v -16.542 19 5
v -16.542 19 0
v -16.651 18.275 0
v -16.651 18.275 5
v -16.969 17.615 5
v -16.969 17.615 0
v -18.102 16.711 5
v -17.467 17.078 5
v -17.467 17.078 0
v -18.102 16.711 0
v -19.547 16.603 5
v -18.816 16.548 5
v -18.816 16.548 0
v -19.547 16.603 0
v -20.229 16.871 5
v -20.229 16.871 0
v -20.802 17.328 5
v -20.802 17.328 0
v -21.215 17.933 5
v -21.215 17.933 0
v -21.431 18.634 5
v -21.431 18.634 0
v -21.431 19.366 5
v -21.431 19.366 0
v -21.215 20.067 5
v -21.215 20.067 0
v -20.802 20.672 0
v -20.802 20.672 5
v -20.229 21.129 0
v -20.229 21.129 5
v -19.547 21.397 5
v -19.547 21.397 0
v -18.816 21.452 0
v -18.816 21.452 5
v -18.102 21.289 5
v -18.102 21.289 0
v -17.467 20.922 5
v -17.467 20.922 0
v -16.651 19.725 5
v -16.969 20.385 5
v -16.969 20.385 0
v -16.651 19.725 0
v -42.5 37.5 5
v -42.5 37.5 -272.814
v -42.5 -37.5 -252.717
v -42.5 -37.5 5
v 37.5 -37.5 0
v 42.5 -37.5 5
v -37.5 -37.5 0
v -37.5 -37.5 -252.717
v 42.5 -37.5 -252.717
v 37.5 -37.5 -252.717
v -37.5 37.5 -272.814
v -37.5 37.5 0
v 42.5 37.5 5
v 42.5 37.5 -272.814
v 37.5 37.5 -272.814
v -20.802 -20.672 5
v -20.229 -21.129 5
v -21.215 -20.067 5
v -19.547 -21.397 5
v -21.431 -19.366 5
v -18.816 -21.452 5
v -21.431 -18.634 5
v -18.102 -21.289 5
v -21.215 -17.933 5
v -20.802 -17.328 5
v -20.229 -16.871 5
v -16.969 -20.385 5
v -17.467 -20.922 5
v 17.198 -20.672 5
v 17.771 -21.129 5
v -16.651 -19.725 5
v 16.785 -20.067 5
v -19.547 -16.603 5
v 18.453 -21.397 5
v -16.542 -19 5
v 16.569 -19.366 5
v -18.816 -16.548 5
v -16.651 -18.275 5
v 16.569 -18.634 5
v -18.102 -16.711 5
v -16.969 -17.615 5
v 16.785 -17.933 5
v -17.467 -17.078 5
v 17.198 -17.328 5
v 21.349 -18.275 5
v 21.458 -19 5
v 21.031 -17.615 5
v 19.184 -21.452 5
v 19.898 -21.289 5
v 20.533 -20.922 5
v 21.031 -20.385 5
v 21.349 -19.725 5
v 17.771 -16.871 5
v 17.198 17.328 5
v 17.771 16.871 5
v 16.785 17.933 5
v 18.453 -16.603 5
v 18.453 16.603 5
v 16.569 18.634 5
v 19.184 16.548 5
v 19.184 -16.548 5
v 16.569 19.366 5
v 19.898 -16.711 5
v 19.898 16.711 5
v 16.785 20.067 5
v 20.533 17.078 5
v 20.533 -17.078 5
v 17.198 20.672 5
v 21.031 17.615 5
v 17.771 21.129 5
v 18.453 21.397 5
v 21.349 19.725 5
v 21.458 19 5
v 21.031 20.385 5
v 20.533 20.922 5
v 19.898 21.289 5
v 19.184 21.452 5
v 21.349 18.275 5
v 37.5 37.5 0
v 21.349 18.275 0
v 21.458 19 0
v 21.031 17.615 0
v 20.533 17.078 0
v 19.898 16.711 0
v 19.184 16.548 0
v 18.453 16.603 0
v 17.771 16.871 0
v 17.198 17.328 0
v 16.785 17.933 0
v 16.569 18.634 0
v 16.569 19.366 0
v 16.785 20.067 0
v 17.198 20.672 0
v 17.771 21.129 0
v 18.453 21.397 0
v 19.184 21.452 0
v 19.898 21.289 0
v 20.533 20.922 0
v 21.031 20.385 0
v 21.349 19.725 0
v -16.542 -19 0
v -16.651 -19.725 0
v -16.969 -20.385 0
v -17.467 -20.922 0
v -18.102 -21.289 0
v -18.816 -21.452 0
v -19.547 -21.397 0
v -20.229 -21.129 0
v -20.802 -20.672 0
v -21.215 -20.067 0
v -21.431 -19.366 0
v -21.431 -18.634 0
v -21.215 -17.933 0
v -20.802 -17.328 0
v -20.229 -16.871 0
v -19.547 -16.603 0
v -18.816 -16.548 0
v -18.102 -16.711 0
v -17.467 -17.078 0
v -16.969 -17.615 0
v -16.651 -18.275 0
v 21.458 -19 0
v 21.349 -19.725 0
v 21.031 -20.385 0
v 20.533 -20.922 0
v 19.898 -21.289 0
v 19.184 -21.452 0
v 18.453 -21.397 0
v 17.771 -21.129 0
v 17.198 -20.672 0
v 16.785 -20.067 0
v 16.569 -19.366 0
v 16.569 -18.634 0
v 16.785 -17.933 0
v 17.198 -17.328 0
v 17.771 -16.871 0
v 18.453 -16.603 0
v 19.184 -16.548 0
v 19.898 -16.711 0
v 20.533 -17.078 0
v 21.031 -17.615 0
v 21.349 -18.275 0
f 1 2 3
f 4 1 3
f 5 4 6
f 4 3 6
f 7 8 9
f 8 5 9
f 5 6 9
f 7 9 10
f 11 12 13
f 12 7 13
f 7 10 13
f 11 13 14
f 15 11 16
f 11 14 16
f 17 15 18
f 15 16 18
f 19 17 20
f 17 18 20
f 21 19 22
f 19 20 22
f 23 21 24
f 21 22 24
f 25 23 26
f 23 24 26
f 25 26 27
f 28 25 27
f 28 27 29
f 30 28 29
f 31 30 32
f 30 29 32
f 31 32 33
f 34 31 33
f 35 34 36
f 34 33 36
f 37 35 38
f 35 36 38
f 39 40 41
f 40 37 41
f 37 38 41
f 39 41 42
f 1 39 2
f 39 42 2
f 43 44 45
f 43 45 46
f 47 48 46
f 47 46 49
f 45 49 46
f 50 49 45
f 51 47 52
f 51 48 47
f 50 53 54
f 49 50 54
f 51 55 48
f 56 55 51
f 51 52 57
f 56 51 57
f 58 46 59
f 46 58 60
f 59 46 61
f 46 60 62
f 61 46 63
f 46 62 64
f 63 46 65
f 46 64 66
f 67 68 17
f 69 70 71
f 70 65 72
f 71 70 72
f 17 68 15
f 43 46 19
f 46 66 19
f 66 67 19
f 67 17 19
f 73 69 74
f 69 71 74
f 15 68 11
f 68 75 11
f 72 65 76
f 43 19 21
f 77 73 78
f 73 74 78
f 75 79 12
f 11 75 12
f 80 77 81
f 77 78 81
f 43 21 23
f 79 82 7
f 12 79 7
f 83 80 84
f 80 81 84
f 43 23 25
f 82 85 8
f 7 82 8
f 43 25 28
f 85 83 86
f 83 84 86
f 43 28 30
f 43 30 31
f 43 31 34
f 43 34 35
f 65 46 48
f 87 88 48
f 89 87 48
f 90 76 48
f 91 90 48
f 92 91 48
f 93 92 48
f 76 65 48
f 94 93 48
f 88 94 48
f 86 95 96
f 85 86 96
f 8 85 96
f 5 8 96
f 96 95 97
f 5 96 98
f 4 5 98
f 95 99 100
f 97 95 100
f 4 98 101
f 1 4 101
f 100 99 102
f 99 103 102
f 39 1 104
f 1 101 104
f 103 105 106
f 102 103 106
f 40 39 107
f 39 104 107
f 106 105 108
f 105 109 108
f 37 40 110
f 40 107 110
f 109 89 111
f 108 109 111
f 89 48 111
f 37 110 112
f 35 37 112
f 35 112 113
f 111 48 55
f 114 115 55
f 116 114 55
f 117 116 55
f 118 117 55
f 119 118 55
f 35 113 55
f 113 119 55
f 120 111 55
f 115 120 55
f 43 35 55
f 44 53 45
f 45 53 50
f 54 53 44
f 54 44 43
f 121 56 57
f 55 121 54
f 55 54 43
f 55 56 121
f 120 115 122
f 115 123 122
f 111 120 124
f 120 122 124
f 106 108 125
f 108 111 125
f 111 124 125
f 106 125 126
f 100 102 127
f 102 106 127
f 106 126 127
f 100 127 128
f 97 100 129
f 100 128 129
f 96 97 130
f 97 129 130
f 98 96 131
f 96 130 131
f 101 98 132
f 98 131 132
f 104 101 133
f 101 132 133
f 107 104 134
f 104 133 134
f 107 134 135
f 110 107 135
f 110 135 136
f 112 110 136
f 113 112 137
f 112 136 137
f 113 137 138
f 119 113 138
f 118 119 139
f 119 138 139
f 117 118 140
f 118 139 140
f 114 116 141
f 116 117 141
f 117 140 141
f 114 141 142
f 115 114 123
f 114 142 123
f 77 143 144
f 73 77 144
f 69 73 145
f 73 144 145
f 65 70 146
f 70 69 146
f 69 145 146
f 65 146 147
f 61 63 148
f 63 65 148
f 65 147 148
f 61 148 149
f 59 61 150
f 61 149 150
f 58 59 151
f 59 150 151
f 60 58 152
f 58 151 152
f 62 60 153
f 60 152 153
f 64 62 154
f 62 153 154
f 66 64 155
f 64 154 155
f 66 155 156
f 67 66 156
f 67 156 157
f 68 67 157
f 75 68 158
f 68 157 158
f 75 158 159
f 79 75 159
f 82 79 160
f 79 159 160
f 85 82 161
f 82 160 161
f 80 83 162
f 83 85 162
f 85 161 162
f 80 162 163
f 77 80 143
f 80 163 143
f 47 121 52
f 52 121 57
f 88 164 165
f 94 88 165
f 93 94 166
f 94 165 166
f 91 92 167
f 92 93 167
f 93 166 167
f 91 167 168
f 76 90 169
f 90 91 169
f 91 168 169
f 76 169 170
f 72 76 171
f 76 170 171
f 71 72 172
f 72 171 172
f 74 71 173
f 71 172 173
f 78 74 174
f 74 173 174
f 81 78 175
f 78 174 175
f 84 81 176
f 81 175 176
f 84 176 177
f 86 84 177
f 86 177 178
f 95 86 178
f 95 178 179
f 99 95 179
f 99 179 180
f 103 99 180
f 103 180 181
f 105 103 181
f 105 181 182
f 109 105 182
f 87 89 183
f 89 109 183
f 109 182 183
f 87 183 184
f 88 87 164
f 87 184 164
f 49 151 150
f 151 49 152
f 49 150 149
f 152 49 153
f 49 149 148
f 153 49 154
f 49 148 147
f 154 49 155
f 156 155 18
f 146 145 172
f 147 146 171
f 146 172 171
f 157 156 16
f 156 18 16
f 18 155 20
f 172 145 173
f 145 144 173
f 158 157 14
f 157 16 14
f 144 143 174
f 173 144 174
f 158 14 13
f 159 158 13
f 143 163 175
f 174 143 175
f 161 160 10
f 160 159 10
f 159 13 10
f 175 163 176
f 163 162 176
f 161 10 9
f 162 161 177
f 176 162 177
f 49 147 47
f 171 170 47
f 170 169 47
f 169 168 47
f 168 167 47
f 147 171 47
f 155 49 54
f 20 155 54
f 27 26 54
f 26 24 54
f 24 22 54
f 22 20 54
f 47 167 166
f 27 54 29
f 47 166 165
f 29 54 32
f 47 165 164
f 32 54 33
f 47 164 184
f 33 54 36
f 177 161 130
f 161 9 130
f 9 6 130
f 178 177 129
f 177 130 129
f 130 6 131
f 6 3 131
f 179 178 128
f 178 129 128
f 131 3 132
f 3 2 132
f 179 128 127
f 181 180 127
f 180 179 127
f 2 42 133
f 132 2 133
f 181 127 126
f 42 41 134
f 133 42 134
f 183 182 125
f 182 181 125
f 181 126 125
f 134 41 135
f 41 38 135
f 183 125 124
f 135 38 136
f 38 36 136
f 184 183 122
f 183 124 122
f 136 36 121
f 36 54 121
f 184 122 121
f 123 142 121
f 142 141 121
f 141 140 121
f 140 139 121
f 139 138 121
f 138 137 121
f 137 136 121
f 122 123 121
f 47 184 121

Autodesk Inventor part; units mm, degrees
ref_plane "YZ Plane" through (0, 0, 0) normal (1, 0, 0) x (0, 1, 0)
ref_plane "XZ Plane" through (0, 0, 0) normal (0, 1, 0) x (-1, 0, 0)
ref_plane "XY Plane" through (0, 0, 0) normal (0, 0, 1) x (1, 0, 0)
sketch "Sketch1" plane through (0, 0, 0) normal (0, 0, 1) x (1, 0, 0)
  line L0 (-37.5, 37.5) -> (37.5, 37.5)
  line L1 (37.5, 37.5) -> (37.5, -37.5)
  line L2 (37.5, -37.5) -> (-37.5, -37.5)
  line L3 (-37.5, -37.5) -> (-37.5, 37.5)
  line L4 (-37.5, 37.5) -> (37.5, -37.5) construction
  line L5 (37.5, 37.5) -> (-37.5, -37.5) construction
  circle A0 centre (0, 0) radius 37.5 projected
  circle A1 centre (19, -19) radius 2.4585 projected
  circle A2 centre (19, 19) radius 2.4585 projected
  circle A3 centre (-19, 19) radius 2.4585 projected
  circle A4 centre (-19, -19) radius 2.4585 projected
  point P0 (0, 0)
extrude "Extrusion1" add sketch "Sketch1" along normal blind 5
sketch "Sketch2" plane through (37.5, -37.5, 0) normal (1, 0, 0) x (0, 0, -1)
  line L0 (25.7498, -847.0546) -> (318.6402, 246.0273) projected
  line L1 (-5, 75) -> (-5, 0) projected
  line L2 (-5, 75) -> (272.8136, 75)
  line L3 (252.7174, 0) -> (-5, 0)
  point P0 (0, 37.5)
extrude "Extrusion2" add sketch "Sketch2" along normal blind 5
mirror "Mirror1" about plane through (0, 0, 0) normal (1, 0, 0) of "Extrusion2"
properties part number "Soporte Cilindro Cortadora"
